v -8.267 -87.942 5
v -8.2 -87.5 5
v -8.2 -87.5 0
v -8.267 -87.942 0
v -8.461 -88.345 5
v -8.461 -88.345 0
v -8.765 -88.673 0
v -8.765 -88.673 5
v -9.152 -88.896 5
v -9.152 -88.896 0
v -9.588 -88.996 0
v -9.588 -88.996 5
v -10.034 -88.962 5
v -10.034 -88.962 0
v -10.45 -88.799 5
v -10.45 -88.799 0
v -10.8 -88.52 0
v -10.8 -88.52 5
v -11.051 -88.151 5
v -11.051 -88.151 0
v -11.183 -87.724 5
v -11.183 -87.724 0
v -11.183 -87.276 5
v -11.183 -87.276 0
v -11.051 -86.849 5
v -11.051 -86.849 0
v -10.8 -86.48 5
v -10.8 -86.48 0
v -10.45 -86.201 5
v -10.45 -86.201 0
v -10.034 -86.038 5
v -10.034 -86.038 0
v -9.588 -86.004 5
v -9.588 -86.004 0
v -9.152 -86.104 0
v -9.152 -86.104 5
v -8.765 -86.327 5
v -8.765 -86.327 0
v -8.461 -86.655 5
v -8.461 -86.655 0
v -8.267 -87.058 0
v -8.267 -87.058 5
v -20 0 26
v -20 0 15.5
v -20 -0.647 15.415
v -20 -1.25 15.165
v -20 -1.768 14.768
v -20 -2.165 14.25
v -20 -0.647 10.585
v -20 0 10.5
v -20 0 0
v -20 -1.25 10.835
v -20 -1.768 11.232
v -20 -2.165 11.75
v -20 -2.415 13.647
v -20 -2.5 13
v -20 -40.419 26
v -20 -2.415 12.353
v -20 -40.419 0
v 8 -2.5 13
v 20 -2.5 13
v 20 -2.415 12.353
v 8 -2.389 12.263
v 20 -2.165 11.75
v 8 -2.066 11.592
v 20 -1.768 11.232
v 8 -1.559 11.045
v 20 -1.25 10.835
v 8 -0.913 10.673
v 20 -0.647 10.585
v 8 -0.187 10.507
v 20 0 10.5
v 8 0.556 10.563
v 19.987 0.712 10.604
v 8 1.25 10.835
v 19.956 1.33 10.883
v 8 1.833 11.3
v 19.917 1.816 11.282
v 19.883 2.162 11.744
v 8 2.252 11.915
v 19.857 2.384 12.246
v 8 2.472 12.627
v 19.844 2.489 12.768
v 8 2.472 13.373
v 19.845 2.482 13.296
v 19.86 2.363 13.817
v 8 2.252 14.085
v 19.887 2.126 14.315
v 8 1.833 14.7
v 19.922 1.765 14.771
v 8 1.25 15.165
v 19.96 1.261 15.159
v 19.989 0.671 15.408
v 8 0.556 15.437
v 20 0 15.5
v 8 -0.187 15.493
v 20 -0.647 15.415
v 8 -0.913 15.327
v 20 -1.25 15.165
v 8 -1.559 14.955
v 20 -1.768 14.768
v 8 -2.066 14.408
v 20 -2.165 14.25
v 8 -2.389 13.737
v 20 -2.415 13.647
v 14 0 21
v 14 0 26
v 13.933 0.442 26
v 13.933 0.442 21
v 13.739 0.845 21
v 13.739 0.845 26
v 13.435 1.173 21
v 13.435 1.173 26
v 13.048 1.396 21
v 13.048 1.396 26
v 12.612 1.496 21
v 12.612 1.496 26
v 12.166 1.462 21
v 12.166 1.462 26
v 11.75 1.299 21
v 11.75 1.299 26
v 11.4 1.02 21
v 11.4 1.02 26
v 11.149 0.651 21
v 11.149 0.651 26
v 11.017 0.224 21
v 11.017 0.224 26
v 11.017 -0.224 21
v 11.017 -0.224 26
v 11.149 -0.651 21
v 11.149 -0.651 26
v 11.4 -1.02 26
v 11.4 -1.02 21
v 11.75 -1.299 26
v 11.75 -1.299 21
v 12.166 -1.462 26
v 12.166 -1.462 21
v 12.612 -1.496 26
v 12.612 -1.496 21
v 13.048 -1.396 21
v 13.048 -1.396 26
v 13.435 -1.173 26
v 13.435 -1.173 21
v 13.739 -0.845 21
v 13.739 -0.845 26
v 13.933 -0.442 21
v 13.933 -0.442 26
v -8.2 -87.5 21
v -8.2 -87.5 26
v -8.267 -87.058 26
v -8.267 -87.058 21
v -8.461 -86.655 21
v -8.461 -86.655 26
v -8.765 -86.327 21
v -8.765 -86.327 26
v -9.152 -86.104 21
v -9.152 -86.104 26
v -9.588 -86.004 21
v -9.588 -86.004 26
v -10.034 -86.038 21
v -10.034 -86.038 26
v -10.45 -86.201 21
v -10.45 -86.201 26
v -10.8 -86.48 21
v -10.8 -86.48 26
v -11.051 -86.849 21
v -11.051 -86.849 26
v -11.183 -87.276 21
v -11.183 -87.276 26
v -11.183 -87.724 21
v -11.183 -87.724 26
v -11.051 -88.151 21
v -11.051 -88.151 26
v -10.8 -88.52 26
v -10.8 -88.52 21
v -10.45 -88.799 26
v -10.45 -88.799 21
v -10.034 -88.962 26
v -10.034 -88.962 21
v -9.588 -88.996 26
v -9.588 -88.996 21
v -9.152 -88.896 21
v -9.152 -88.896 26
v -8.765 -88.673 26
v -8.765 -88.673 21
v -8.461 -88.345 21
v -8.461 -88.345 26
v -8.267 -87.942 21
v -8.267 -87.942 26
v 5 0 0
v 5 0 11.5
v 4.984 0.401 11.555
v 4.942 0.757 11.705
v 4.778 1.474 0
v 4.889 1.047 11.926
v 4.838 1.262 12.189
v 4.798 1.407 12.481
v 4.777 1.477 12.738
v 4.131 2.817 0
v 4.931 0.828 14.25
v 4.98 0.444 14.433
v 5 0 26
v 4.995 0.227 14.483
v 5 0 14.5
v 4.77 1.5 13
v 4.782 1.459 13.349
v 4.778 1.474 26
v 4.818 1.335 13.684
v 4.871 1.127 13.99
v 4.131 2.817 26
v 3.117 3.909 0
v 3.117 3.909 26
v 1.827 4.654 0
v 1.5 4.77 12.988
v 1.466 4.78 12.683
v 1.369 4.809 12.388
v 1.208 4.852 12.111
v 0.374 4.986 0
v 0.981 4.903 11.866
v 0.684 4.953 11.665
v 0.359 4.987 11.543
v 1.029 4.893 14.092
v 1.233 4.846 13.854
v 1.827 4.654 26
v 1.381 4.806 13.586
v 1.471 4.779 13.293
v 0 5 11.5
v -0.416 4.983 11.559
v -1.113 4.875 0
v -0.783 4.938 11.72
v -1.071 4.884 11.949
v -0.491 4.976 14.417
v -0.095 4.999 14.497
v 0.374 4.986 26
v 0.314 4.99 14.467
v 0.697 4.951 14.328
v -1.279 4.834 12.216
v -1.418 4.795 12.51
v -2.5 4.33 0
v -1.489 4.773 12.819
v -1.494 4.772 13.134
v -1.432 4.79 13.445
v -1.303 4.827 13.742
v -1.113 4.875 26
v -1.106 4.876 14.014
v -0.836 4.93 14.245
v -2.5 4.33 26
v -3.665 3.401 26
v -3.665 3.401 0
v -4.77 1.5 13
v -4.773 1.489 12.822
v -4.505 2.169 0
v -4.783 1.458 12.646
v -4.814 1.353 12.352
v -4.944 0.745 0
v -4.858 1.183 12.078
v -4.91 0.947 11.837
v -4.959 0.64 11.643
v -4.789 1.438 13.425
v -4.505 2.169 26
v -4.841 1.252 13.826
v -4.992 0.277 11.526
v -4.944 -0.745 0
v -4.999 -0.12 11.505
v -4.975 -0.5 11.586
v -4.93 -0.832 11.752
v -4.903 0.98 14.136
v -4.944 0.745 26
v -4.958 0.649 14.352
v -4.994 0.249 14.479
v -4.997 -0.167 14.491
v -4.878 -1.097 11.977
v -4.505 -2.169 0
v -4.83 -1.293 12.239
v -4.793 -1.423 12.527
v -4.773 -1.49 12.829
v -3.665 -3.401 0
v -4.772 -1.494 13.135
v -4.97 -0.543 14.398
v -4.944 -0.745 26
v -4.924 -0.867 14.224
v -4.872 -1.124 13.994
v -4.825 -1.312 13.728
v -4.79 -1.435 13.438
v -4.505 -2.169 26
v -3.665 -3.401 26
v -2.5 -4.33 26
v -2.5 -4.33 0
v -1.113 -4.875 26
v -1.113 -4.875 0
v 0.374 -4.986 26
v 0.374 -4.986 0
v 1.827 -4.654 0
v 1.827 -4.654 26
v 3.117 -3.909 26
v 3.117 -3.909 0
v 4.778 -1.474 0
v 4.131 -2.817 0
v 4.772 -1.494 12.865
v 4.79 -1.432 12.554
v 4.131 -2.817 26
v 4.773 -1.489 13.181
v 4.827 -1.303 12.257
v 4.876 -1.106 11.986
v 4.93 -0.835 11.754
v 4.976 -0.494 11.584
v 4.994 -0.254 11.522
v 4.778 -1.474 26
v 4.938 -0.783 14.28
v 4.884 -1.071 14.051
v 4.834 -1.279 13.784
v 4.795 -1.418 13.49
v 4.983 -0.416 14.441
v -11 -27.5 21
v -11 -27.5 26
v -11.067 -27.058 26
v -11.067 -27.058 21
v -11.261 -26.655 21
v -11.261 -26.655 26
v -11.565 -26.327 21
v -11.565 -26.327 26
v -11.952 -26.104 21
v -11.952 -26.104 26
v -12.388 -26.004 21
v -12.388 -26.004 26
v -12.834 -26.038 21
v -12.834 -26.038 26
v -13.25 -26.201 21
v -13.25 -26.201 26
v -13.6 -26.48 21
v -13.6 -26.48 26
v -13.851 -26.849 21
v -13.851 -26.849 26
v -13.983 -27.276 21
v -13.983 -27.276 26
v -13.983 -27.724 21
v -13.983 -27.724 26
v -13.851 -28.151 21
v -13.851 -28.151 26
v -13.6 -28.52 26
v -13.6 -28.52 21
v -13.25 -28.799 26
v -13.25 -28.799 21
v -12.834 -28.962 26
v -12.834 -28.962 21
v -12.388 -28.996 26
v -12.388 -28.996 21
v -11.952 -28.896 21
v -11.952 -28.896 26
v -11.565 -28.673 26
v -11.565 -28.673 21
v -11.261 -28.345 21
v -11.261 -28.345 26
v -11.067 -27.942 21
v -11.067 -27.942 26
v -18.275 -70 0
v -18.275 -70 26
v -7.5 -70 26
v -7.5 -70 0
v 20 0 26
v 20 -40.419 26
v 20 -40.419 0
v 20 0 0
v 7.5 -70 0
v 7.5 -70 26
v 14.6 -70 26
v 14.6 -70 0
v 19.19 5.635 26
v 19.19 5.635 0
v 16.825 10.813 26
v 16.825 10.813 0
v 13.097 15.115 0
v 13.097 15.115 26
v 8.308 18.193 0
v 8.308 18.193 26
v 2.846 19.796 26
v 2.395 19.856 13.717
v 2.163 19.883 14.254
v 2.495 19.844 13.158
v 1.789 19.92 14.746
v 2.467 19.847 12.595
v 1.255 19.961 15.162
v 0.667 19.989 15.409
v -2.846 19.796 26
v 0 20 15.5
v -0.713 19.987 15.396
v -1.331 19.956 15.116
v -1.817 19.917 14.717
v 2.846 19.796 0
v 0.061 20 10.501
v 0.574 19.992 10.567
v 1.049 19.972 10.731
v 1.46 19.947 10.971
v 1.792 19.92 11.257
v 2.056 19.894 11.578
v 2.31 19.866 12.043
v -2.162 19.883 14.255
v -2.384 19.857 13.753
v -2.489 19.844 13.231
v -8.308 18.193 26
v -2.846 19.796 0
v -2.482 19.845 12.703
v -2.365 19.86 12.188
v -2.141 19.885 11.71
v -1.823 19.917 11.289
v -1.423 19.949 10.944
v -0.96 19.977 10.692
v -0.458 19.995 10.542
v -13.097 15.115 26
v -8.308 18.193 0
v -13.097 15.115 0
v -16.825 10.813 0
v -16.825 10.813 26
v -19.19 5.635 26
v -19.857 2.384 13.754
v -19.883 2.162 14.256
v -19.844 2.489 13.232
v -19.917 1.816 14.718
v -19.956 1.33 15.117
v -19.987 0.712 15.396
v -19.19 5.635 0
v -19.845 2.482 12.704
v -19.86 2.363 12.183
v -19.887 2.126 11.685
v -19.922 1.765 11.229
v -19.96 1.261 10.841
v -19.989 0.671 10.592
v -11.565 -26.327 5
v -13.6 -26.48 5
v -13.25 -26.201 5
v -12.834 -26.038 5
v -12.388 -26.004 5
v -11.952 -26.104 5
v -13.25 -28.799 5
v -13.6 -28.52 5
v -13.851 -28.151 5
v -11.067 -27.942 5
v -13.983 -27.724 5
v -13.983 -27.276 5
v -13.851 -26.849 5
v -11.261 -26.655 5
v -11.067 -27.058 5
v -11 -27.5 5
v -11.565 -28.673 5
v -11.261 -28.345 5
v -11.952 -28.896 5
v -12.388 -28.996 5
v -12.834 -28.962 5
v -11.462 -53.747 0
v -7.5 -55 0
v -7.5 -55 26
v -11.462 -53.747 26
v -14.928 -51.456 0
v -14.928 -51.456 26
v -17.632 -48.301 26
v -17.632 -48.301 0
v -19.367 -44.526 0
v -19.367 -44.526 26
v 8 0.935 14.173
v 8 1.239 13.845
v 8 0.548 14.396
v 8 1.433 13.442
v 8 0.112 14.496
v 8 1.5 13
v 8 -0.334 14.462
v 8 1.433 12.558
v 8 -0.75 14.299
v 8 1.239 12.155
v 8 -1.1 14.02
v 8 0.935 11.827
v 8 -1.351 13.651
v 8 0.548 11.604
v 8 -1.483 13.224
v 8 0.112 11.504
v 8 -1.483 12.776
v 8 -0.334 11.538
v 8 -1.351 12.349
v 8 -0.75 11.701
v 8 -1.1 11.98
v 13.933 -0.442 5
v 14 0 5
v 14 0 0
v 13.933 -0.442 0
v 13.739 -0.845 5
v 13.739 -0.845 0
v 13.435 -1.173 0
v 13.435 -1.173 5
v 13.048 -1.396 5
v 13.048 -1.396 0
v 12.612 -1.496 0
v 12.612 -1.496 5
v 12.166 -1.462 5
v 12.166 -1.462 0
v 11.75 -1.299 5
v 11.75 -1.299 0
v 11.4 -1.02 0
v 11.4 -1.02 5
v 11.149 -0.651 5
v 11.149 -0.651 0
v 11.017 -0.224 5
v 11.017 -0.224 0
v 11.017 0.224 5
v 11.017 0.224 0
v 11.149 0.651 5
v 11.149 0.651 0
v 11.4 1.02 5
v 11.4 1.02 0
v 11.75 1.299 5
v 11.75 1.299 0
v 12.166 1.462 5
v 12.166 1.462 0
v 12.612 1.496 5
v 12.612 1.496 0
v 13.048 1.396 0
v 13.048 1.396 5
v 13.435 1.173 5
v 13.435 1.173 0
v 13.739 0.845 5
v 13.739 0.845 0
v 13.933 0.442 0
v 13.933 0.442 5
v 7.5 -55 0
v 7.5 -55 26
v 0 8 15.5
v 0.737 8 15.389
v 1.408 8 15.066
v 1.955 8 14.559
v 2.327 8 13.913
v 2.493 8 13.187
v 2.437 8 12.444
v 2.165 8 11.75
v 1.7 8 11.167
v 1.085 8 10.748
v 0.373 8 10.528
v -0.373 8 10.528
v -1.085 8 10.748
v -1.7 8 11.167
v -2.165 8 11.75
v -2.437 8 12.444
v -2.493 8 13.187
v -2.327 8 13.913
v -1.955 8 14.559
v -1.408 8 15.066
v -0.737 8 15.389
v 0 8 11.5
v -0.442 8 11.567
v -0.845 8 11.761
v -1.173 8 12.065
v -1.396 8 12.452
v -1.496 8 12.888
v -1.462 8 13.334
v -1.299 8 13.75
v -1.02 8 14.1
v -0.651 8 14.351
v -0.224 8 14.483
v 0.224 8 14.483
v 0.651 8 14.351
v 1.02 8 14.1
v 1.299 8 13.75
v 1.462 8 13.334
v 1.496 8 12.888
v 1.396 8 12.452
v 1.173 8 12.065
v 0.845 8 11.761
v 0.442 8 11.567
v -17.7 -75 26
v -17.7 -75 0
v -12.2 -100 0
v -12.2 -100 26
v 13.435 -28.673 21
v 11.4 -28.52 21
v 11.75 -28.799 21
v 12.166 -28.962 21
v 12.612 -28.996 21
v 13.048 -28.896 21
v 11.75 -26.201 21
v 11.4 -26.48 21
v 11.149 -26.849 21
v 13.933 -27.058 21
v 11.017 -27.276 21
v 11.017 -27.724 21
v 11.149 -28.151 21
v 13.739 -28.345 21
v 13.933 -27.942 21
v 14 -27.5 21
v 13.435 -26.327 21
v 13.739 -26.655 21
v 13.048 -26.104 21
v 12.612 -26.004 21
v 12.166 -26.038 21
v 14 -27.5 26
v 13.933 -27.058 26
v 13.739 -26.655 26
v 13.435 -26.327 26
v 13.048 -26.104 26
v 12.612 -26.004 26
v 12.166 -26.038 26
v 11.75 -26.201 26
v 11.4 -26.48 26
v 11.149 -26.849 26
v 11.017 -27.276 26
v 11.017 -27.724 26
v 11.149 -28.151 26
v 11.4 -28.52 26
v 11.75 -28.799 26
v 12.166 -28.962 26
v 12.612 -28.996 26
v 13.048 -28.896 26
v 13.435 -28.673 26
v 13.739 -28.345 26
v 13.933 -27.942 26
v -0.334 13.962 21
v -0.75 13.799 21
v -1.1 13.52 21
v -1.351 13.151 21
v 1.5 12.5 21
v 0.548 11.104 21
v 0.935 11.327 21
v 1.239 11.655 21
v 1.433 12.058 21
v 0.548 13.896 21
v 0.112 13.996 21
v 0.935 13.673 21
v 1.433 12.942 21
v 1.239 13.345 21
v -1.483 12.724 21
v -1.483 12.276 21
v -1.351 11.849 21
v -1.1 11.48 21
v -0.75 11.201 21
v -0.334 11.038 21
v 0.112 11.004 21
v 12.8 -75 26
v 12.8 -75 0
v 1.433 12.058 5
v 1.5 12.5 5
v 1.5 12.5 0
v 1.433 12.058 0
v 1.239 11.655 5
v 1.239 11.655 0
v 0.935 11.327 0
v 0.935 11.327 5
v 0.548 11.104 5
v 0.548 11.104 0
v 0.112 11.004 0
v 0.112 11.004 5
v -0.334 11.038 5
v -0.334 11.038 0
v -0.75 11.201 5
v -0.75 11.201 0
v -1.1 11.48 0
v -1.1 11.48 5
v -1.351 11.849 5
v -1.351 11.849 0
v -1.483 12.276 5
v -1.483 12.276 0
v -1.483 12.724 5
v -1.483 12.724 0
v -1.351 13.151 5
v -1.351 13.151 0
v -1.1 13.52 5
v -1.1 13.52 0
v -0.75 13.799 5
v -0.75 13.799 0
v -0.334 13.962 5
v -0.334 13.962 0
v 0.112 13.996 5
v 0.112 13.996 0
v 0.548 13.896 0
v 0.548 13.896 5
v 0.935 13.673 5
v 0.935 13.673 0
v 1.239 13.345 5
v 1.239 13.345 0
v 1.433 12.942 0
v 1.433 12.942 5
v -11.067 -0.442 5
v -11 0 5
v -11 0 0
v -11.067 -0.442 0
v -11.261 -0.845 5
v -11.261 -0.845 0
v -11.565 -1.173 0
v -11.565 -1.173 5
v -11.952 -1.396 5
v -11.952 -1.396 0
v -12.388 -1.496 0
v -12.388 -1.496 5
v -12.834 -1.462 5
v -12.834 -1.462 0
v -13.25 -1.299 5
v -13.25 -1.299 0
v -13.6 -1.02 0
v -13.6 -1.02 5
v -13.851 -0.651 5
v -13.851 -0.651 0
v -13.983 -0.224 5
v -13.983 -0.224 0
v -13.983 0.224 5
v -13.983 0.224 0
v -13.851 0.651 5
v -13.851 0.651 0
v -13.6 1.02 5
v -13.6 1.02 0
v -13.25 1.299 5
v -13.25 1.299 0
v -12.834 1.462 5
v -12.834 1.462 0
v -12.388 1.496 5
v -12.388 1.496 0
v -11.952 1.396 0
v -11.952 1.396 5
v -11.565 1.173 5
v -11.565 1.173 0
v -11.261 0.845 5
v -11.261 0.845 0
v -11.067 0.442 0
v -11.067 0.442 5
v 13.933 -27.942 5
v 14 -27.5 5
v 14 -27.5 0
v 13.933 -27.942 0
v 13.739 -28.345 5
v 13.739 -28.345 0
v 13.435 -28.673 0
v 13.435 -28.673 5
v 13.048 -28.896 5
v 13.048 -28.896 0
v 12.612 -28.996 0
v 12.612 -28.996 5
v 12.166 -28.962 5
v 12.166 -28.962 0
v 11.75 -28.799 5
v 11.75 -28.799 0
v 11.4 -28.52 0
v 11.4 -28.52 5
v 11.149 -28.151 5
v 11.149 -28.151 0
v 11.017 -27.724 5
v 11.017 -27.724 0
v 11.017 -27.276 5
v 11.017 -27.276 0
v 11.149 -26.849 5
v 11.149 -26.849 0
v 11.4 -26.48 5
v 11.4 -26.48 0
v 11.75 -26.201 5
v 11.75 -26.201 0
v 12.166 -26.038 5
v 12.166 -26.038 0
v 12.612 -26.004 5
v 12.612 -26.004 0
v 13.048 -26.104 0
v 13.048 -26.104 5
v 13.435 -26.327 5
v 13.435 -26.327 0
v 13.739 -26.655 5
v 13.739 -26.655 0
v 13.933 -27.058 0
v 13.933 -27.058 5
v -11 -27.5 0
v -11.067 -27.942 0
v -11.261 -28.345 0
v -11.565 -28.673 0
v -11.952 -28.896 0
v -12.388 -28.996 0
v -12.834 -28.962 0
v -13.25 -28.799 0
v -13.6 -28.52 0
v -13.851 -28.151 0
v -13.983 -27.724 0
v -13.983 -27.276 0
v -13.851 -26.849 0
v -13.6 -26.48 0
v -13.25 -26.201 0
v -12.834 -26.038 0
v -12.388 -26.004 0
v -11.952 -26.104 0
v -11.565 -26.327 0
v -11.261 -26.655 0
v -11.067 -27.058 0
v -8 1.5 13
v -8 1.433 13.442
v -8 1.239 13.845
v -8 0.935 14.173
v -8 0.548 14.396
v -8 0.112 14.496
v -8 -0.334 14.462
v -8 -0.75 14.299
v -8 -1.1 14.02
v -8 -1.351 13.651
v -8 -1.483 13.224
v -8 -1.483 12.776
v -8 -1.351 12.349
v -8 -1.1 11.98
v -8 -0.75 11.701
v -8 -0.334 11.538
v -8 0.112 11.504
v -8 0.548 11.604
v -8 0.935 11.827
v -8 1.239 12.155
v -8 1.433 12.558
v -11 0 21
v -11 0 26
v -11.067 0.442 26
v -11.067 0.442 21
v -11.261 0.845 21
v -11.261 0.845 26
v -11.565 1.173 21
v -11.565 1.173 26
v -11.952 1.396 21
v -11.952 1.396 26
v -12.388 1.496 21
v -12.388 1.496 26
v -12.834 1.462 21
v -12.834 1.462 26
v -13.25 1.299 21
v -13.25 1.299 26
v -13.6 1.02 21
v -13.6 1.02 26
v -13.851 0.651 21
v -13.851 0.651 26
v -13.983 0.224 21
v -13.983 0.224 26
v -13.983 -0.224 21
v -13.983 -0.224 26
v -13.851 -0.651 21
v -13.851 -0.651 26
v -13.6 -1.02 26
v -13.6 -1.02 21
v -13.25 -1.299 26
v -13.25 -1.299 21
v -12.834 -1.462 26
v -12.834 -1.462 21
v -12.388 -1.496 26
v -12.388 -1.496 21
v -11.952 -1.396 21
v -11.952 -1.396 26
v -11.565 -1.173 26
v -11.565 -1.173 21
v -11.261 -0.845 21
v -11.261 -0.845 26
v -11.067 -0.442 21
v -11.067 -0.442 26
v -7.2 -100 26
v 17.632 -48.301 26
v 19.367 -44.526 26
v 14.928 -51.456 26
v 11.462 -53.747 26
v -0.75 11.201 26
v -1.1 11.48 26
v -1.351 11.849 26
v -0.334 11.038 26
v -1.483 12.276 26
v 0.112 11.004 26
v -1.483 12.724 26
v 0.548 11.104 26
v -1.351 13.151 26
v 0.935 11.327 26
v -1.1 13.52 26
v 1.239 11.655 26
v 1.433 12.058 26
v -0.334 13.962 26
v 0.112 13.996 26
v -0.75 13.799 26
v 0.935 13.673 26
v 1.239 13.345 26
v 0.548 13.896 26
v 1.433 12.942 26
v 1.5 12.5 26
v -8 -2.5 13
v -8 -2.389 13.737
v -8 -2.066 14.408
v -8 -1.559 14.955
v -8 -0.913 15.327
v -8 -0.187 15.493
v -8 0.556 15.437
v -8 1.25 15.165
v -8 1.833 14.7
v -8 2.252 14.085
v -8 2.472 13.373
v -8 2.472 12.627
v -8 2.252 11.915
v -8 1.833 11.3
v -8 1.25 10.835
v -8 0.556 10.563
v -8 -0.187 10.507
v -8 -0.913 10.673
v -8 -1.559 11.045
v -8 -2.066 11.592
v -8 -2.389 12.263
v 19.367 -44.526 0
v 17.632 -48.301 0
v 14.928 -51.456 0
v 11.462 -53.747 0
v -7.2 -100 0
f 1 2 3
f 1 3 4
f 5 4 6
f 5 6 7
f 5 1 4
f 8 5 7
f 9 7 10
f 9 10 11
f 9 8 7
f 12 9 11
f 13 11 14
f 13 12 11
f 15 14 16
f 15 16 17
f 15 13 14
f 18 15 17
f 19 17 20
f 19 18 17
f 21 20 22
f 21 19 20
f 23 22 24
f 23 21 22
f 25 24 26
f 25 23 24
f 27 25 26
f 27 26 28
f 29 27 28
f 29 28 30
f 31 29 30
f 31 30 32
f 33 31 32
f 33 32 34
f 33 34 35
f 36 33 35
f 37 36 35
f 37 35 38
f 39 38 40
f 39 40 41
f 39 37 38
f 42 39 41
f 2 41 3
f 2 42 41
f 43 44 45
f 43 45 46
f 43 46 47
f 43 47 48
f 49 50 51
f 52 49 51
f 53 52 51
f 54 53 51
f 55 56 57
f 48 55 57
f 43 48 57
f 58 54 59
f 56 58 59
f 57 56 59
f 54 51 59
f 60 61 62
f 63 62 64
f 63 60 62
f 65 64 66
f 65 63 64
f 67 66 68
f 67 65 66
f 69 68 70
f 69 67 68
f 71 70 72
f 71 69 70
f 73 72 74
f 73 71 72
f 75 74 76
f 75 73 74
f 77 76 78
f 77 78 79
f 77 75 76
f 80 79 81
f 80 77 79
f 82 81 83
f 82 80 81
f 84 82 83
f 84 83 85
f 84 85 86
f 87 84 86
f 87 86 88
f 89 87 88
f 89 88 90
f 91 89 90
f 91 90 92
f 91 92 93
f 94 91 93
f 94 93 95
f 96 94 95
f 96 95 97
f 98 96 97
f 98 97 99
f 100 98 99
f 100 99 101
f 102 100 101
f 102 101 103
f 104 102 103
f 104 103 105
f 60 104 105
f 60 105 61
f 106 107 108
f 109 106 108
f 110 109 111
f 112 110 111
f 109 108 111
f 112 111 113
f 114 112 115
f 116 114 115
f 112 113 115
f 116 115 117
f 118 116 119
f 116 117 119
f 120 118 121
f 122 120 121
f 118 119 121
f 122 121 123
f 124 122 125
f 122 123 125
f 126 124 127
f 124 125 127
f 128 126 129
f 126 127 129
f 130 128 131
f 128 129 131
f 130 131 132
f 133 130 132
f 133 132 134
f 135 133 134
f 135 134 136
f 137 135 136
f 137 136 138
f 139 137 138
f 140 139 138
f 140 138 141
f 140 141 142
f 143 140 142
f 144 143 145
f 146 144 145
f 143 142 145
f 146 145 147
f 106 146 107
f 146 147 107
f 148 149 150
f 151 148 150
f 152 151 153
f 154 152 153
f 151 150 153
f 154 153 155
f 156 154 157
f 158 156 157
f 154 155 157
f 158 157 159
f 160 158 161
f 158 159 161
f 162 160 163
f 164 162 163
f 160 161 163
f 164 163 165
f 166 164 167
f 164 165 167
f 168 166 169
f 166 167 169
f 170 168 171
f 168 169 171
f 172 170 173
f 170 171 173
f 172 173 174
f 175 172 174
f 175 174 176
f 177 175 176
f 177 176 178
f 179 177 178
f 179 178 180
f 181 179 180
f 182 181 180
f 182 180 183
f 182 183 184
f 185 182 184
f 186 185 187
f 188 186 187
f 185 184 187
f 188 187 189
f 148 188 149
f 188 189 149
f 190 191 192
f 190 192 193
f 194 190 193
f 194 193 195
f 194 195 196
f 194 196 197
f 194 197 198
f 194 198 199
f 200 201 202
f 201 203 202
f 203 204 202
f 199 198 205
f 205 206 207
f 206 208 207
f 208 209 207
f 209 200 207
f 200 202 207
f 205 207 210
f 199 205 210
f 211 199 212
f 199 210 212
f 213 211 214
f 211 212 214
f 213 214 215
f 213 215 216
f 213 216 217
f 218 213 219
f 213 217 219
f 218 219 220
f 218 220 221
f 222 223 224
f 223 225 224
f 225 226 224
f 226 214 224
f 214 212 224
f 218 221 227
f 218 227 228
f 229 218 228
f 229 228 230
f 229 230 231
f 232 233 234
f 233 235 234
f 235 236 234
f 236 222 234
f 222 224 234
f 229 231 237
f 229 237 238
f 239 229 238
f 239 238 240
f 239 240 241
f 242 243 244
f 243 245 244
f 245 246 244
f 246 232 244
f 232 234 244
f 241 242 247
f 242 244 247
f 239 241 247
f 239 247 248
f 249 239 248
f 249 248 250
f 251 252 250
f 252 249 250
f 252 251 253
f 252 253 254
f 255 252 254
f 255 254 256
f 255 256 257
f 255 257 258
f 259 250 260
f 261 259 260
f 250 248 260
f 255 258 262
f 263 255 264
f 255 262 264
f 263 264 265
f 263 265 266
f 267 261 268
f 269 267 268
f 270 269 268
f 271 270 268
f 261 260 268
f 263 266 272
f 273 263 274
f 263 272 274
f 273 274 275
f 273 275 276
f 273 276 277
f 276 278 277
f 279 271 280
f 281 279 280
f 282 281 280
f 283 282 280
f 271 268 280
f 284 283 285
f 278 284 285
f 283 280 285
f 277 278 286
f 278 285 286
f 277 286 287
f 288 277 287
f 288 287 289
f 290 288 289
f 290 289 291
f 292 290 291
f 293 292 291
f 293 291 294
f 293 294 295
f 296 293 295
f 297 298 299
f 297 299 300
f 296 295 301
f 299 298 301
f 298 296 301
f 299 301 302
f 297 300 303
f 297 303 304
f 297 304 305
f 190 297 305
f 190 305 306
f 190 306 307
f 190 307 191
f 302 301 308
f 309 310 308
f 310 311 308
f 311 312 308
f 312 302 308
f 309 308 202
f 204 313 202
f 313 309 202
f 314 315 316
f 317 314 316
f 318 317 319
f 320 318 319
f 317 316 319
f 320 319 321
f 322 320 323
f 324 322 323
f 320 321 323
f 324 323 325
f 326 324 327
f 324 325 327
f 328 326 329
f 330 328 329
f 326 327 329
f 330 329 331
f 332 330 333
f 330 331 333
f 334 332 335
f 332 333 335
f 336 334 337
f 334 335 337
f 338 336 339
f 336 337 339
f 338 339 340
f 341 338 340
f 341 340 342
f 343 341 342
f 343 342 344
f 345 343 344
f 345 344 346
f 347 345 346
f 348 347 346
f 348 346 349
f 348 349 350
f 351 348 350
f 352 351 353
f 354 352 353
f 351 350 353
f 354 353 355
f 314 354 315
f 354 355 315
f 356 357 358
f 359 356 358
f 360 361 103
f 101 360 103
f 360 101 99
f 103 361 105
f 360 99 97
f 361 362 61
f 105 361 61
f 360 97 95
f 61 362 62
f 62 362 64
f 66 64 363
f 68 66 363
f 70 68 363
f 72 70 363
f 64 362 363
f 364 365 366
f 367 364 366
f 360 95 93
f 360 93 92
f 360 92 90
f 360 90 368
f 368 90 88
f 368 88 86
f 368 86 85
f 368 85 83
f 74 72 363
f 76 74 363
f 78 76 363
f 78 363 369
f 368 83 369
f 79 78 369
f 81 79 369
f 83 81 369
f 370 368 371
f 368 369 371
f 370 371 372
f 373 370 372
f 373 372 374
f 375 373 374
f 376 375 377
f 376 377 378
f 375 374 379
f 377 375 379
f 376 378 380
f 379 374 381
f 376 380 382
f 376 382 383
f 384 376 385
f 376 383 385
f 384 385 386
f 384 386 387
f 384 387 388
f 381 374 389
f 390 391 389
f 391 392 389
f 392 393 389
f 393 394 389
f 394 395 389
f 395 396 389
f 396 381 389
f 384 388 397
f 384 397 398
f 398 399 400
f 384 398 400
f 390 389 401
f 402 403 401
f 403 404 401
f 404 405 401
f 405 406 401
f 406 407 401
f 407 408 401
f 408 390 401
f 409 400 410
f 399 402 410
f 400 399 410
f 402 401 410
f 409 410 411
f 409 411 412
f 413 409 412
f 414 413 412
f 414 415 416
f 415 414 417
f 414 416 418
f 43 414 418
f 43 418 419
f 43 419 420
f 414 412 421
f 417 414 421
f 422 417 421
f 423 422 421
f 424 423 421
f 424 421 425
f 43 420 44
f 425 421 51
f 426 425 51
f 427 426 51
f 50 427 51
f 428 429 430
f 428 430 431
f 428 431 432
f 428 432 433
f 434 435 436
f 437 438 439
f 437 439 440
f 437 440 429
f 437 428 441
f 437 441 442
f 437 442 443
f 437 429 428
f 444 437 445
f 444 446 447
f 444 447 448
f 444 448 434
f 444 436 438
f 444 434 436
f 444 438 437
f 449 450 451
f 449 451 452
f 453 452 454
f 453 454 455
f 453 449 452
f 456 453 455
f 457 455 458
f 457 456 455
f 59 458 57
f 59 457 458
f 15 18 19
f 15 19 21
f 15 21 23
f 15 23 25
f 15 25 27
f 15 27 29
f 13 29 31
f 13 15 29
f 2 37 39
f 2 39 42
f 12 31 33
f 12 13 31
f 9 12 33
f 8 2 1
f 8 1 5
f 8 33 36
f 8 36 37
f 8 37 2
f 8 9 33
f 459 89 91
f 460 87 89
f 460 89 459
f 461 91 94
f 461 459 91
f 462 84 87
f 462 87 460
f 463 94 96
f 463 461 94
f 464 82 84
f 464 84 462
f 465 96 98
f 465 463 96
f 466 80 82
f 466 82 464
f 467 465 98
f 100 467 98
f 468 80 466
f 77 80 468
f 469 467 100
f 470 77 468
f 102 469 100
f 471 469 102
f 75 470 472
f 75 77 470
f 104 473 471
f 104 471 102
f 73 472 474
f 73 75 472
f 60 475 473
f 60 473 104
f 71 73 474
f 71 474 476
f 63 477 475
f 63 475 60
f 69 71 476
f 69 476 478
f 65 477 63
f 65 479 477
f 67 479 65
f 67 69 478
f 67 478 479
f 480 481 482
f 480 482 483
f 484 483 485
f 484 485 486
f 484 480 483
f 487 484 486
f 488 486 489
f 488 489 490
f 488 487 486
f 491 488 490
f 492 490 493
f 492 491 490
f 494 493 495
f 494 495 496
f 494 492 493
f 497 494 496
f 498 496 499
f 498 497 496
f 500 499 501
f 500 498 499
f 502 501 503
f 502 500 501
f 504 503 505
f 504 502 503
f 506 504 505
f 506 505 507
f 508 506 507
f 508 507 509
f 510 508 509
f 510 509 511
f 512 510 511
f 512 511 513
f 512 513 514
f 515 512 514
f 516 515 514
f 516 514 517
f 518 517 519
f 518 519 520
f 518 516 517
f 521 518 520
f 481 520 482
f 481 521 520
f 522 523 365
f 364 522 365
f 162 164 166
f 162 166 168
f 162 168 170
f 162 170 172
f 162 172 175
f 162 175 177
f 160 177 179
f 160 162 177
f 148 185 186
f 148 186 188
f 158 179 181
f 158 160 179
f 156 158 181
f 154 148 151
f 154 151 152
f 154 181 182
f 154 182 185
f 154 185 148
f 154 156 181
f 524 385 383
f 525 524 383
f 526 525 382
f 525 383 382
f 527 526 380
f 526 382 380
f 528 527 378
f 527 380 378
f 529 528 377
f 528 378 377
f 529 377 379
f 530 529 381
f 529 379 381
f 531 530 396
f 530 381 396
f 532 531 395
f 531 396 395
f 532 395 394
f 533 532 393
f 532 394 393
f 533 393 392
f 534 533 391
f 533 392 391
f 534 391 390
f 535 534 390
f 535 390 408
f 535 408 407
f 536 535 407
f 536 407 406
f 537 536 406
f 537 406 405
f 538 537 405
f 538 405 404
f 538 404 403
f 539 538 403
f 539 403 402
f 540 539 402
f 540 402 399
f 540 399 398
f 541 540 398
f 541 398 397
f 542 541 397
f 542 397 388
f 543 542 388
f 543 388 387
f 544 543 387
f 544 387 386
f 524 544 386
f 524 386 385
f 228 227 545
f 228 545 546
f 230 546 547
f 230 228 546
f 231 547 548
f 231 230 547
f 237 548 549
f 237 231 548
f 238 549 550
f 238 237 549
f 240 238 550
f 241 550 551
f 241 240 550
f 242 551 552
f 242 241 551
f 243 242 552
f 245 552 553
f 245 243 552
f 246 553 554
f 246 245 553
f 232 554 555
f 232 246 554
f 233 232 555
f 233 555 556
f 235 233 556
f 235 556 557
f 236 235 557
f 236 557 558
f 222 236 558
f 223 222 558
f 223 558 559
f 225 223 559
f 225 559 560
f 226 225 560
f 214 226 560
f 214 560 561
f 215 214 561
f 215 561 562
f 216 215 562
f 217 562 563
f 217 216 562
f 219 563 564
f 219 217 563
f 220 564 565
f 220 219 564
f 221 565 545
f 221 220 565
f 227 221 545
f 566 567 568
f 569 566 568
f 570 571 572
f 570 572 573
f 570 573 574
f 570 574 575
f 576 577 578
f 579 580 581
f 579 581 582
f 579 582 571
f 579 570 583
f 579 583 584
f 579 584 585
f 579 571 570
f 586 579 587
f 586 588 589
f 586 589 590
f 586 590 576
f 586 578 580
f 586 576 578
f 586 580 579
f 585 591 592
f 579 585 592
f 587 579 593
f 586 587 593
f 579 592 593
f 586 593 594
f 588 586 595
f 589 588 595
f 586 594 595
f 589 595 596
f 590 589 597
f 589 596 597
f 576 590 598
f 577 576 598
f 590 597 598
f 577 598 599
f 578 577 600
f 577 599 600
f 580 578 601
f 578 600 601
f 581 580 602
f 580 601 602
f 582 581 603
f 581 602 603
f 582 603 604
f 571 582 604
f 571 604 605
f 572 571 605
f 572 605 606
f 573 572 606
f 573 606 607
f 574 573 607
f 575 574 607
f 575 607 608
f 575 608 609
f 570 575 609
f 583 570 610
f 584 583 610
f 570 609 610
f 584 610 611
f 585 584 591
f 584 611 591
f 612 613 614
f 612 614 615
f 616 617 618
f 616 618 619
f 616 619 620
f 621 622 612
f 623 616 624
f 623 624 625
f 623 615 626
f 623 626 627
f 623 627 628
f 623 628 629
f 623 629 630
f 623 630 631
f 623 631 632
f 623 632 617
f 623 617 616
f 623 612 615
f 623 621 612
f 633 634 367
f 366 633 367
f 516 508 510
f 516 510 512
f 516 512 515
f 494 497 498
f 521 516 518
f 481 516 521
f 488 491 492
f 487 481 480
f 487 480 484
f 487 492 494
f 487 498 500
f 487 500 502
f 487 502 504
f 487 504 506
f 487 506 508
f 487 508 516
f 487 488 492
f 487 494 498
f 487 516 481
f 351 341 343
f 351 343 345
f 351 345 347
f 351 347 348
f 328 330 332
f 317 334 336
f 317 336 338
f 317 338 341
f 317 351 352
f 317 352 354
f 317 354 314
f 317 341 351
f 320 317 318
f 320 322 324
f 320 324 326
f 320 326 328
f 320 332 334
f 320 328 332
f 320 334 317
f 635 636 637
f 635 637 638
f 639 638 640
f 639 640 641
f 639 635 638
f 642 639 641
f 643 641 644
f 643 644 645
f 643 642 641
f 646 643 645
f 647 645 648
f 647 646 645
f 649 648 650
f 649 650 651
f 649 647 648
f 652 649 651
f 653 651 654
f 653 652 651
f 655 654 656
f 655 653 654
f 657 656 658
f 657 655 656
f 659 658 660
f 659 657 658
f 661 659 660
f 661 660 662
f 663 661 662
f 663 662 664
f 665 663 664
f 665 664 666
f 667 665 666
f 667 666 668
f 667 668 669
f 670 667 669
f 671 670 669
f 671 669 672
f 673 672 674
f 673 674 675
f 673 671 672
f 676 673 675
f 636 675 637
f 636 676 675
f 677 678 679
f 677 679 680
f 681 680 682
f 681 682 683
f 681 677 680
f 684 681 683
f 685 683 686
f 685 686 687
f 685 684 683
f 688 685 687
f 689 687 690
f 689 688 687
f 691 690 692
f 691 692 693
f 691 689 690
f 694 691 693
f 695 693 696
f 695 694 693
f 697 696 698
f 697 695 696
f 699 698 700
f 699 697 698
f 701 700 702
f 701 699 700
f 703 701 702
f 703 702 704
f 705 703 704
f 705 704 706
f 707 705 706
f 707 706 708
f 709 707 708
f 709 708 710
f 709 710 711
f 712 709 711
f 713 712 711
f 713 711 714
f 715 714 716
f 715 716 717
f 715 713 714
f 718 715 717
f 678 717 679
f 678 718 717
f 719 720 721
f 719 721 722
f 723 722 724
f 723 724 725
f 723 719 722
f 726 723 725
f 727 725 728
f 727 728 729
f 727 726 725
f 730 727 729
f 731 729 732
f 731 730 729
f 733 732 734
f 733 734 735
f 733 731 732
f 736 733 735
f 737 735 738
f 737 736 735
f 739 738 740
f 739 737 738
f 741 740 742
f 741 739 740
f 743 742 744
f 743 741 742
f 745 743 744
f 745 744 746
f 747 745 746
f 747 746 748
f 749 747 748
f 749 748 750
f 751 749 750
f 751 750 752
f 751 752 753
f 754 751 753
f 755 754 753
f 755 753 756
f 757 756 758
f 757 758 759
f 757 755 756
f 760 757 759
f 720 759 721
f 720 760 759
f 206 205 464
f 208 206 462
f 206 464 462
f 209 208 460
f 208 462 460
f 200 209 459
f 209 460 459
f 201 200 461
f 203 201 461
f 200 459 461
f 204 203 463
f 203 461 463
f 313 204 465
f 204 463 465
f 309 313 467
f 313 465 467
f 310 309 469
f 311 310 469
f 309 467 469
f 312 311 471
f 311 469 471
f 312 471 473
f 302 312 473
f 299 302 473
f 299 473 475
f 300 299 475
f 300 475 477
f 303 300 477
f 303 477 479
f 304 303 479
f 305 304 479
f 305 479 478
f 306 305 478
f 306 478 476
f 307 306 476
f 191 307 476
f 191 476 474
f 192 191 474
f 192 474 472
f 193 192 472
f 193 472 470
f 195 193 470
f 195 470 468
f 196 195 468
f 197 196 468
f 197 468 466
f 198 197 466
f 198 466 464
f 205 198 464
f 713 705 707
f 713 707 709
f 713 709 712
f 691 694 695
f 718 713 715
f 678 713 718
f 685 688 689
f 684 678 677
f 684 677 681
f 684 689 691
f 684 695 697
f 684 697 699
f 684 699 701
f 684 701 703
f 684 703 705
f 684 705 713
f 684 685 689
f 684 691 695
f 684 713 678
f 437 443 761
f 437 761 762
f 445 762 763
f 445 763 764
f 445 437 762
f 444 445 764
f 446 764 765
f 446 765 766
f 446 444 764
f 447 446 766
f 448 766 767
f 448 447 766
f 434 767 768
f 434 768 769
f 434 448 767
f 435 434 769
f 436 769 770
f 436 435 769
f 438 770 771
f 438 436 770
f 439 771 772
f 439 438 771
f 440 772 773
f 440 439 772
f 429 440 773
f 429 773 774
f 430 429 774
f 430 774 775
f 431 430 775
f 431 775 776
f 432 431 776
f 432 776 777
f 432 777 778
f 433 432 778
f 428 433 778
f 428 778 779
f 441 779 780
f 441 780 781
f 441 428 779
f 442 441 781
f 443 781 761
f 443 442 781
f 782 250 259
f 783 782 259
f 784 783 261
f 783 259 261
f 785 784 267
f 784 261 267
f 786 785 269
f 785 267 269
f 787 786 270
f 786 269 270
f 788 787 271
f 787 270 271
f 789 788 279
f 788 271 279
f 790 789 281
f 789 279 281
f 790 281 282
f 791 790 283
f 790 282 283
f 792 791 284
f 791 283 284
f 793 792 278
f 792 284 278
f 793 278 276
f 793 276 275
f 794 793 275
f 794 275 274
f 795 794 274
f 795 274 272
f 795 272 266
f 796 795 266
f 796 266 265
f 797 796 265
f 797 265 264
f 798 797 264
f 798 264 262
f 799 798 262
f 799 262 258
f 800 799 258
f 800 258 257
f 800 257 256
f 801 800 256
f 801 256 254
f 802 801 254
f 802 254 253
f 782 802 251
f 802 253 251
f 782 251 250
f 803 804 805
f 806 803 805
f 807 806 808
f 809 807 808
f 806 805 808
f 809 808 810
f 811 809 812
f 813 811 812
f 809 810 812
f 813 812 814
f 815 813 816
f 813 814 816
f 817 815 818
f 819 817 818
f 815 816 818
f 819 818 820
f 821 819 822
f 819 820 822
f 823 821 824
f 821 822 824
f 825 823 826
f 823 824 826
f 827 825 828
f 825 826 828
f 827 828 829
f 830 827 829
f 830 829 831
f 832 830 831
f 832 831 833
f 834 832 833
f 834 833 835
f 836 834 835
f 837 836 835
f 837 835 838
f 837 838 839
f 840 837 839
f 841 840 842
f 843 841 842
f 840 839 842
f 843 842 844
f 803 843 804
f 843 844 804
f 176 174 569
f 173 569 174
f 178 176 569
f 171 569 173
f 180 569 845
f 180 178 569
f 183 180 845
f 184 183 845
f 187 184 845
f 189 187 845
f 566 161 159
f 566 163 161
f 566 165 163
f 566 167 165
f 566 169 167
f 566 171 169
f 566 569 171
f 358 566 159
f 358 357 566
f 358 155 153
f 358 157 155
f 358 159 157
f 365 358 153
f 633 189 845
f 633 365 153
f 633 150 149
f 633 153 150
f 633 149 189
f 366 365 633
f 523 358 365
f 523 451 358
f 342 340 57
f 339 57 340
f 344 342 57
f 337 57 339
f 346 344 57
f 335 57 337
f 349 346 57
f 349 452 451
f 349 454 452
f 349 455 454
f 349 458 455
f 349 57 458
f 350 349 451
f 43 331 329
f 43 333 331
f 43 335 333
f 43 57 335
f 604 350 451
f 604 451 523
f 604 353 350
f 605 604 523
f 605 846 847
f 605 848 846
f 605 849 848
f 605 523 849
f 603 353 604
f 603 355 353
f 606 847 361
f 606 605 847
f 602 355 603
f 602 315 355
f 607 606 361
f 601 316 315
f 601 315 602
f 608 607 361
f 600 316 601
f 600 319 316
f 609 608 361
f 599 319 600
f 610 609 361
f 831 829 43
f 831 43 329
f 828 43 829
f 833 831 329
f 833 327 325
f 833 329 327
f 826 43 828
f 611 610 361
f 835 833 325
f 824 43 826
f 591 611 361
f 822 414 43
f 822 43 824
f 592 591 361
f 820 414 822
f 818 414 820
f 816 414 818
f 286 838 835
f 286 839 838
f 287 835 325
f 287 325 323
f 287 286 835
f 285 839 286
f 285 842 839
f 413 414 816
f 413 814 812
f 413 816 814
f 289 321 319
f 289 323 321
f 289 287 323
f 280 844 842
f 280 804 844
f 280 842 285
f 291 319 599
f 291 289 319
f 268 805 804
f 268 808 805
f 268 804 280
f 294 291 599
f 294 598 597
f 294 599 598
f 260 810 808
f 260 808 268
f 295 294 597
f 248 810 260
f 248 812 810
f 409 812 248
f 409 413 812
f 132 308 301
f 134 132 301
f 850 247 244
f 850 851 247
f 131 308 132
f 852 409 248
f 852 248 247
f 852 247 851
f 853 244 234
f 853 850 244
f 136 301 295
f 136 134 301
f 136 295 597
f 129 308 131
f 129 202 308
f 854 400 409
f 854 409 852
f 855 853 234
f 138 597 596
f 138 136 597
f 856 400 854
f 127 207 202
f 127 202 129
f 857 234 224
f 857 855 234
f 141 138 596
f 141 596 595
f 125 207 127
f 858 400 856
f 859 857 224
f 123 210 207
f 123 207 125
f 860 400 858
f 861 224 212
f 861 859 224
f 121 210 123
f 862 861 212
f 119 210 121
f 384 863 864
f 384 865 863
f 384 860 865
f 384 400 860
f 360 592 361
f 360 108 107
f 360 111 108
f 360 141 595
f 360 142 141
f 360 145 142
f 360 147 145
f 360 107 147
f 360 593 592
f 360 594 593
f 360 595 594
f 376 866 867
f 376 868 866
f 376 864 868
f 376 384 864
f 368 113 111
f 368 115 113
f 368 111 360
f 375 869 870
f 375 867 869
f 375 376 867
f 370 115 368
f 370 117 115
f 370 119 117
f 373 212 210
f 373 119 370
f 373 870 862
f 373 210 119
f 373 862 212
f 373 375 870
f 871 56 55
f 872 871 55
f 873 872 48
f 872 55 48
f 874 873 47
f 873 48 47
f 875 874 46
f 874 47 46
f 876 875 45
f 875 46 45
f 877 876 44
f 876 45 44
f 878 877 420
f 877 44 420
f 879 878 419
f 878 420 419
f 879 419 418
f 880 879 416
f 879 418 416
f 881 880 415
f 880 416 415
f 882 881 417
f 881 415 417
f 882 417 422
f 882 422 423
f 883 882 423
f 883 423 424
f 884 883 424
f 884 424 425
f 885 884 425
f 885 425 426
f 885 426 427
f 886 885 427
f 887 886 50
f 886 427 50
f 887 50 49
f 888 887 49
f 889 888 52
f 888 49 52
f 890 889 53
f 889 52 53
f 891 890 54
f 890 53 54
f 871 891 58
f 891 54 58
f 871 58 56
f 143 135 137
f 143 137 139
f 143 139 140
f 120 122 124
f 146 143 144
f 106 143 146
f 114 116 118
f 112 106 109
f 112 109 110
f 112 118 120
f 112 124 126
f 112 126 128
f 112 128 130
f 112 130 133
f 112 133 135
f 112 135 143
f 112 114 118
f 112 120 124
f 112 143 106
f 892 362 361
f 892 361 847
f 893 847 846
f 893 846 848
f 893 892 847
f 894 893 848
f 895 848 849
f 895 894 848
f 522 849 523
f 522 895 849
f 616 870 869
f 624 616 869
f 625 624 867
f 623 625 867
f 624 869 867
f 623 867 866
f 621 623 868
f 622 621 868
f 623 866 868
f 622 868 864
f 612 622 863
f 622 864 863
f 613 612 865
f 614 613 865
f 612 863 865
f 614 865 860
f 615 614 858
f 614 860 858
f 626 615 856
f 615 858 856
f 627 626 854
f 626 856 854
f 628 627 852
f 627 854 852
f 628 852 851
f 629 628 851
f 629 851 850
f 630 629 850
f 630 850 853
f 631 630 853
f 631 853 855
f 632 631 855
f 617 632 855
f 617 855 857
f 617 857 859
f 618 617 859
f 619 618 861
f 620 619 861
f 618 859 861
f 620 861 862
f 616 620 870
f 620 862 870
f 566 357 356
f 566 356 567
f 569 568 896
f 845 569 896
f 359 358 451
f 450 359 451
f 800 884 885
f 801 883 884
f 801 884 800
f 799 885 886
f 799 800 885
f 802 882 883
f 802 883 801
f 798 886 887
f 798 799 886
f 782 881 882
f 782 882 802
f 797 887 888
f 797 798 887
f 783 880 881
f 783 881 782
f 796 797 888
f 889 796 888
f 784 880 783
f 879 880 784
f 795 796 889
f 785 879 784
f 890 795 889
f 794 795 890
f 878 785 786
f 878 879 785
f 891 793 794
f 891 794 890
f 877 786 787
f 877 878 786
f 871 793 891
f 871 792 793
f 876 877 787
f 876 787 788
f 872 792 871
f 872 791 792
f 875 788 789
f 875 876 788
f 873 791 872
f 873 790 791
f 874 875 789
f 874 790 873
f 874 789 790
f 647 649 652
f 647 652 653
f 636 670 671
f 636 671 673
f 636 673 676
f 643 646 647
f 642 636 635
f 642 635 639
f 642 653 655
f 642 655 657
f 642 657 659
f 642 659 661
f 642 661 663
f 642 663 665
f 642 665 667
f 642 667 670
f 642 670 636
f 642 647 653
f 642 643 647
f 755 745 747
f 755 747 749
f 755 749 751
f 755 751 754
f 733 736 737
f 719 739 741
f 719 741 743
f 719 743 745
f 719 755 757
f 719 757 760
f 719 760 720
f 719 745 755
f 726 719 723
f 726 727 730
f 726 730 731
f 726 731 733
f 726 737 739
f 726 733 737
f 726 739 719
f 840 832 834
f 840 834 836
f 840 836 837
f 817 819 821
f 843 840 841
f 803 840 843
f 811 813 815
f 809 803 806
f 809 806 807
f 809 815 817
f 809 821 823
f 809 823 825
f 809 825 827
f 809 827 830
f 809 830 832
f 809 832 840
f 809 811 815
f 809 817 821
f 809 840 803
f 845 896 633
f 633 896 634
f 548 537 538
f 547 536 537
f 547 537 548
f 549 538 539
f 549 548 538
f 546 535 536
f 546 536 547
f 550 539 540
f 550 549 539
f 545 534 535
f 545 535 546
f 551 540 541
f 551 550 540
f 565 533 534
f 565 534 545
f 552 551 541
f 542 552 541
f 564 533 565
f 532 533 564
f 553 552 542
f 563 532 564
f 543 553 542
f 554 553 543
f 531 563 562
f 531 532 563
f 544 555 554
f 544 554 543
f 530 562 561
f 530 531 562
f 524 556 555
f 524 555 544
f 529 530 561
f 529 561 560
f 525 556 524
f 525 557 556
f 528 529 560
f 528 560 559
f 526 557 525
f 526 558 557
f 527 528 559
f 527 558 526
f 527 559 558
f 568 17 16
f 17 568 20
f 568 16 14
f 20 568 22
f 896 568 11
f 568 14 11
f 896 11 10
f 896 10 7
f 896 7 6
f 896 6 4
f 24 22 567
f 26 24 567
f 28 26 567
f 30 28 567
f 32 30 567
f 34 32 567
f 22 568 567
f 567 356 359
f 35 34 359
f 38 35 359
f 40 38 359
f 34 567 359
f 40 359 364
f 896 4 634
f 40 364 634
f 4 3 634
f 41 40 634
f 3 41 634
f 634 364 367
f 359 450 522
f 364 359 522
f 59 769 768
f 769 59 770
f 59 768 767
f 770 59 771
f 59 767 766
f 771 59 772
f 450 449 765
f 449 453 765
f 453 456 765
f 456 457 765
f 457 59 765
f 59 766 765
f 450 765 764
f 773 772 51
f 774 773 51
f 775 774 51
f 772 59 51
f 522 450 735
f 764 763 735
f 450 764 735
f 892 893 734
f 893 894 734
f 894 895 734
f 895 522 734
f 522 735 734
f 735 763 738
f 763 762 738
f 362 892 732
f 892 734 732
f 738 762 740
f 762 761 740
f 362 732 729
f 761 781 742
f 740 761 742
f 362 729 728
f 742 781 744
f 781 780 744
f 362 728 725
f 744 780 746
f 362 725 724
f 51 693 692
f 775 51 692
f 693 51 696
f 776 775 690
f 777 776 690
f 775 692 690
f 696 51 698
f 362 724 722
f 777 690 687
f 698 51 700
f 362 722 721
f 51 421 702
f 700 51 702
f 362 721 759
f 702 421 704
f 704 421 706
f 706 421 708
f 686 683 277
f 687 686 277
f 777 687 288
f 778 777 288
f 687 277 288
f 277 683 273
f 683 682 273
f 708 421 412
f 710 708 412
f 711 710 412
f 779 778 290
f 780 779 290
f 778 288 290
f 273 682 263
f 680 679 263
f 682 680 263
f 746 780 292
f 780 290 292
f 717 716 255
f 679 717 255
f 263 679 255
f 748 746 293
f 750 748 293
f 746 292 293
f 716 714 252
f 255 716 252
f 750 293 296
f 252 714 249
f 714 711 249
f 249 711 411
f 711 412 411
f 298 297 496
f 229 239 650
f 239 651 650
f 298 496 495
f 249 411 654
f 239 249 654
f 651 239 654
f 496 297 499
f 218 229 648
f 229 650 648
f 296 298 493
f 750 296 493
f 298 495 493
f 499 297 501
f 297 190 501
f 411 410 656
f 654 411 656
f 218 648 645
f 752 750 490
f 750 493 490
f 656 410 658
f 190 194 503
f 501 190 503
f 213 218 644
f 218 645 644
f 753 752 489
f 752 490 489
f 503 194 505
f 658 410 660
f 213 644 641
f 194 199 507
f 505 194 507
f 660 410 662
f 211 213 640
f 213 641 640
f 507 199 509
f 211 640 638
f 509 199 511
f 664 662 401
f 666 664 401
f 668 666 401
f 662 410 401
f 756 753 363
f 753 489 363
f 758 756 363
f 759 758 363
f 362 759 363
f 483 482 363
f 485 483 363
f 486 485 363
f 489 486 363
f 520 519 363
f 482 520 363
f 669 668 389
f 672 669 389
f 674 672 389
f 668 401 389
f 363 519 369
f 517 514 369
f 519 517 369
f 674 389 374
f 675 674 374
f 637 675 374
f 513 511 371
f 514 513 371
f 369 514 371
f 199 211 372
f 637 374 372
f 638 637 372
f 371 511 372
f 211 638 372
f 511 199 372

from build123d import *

# Parameters (mm, degrees)
EXTRUDE_1_DEPTH          = 26
SKETCH_2_R               = 5
CUT_EXTRUDE_1_DEPTH      = 26
SKETCH_5_R               = 2.5
CUT_EXTRUDE_3_DEPTH      = 12
CUT_EXTRUDE_START        = -12
SKETCH_6_R               = 2.5
CUT_EXTRUDE_4_DEPTH      = 12
CUT_EXTRUDE_5_REACH      = 109.051
SKETCH_7_R               = 1.5
CUT_EXTRUDE_6_REACH      = 107.243
CUT_EXTRUDE_6_END_RADIUS = 20
SKETCH_8_R               = 1.5
SKETCH_10_R              = 2.5
CUT_EXTRUDE_7_DEPTH      = 12
CUT_EXTRUDE_8_REACH      = 107.243
CUT_EXTRUDE_START_2      = -26
CUT_EXTRUDE_9_DEPTH      = 26
SKETCH_13_R              = 1.5
CUT_EXTRUDE_10_DEPTH     = 5
CUT_EXTRUDE_START_3      = -5
SKETCH_14_R              = 1.5
CUT_EXTRUDE_11_DEPTH     = 5


# Read off the part's stored shape, not the designer's step: 切除-拉伸9
with BuildPart() as part:
    # 草图1 → 凸台-拉伸1 (new body)
    with BuildSketch(Plane.XY):
        with BuildLine():
            ThreePointArc((20, 0), (0, 20), (-20, 0))
            Line((-20, 0), (20, 0))
        make_face()
        with BuildLine():
            Line((20, 0), (-20, 0))
            ThreePointArc((-20, 0), (0, -20), (20, 0))
        make_face()
        with BuildLine():
            ThreePointArc((20, 0), (0, -20), (-20, 0))
            Line((-20, 0), (-20, -55))
            Line((-20, -55), (20, -55))
            Line((20, -55), (20, 0))
        make_face()
        Polygon((20, -55), (-20, -55), (-17.7, -75), (-12.2, -100), (-7.2, -100), (12.8, -75), align=None)
    extrude(amount=EXTRUDE_1_DEPTH)

    # 草图2 → 切除-拉伸1 (cut)
    with BuildSketch(Plane.XY.offset(26)):
        Circle(SKETCH_2_R)
    extrude(amount=-CUT_EXTRUDE_1_DEPTH, mode=Mode.SUBTRACT)

    # 草图5 → 切除-拉伸3 (cut)
    with BuildSketch(Plane.ZY.offset(20)):
        with Locations(Location((13, 0, 0), (0, 0, 270))):
            Circle(SKETCH_5_R)
    extrude(amount=-CUT_EXTRUDE_3_DEPTH, mode=Mode.SUBTRACT)

    # 草图6 → 切除-拉伸4 (cut)
    with BuildSketch(Plane(origin=(20, 0, 0), x_dir=(0, 0, -1), z_dir=(1, 0, 0)).offset(CUT_EXTRUDE_START)):
        with Locations(Location((-13, 0, 0), (0, 0, 270))):
            Circle(SKETCH_6_R)
    extrude(amount=CUT_EXTRUDE_4_DEPTH, mode=Mode.SUBTRACT)

    # 切除-拉伸5: up to this face of the body (flat: up to its plane)
    cut_extrude_5_end = Plane(part.part.faces().sort_by_distance((-8, 0, 13))[0])
    # 草图7 → 切除-拉伸5 (cut, up to the picked face)
    with BuildSketch(Plane(origin=(8, 0, 0), x_dir=(0, 0, -1), z_dir=(1, 0, 0)), mode=Mode.PRIVATE) as cut_extrude_5_sk1:
        with Locations(Location((-13, 0, 0), (0, 0, 90))):
            Circle(SKETCH_7_R)
    cut_extrude_5_tool1 = split(extrude(cut_extrude_5_sk1.sketch, amount=-CUT_EXTRUDE_5_REACH, mode=Mode.PRIVATE), bisect_by=cut_extrude_5_end, keep=Keep.BOTH, mode=Mode.PRIVATE)
    add(cut_extrude_5_tool1.solids().sort_by(Axis((8, 0, 13), (-1, 0, 0)))[0], mode=Mode.SUBTRACT)

    # 切除-拉伸6: up to this cylinder (the profile starts inside it)
    cut_extrude_6_end = Plane(origin=(0, 0, 13), z_dir=(0, 0, -1)) * Cylinder(CUT_EXTRUDE_6_END_RADIUS, 255.486, mode=Mode.PRIVATE)
    # 草图8 → 切除-拉伸6 (cut, up to the surface)
    with BuildSketch(Plane(origin=(0, 0, 0), x_dir=(1, 0, 0), z_dir=(0, 1, 0)), mode=Mode.PRIVATE) as cut_extrude_6_sk1:
        with Locations(Location((0, -13, 0), (0, 0, 90))):
            Circle(SKETCH_8_R)
    cut_extrude_6_tool1 = extrude(cut_extrude_6_sk1.sketch, amount=CUT_EXTRUDE_6_REACH, mode=Mode.PRIVATE) & cut_extrude_6_end
    add(cut_extrude_6_tool1.solids().sort_by_distance((0, 0, 13))[0], mode=Mode.SUBTRACT)

    # 草图10 → 切除-拉伸7 (cut)
    with BuildSketch(Plane(origin=(0, 20, 0), x_dir=(1, 0, 0), z_dir=(0, 1, 0))):
        with Locations(Location((0, -13, 0), (0, 0, 270))):
            Circle(SKETCH_10_R)
    extrude(amount=-CUT_EXTRUDE_7_DEPTH, mode=Mode.SUBTRACT)

    # 草图11 → 切除-拉伸8 (cut, up to next)
    with BuildSketch(Plane.XY.offset(26), mode=Mode.PRIVATE) as cut_extrude_8_sk1:
        Polygon((-7.5, -55), (-20, -55), (-18.275, -70), (-7.5, -70), align=None)
    cut_extrude_8_tool1 = extrude(cut_extrude_8_sk1.sketch, amount=-CUT_EXTRUDE_8_REACH, mode=Mode.PRIVATE) & part.part
    # 草图11 → 切除-拉伸8 (cut, up to next)
    with BuildSketch(Plane.XY.offset(26), mode=Mode.PRIVATE) as cut_extrude_8_sk2:
        Polygon((20, -55), (7.5, -55), (7.5, -70), (14.6, -70), align=None)
    cut_extrude_8_tool2 = extrude(cut_extrude_8_sk2.sketch, amount=-CUT_EXTRUDE_8_REACH, mode=Mode.PRIVATE) & part.part
    add(cut_extrude_8_tool1.solids().sort_by_distance((-13.329404, -62.314715, 26))[0], mode=Mode.SUBTRACT)
    add(cut_extrude_8_tool2.solids().sort_by_distance((12.52398, -61.811224, 26))[0], mode=Mode.SUBTRACT)

    # 切除-拉伸9 outline → 切除-拉伸9 (cut)
    with BuildSketch(Plane.XY.offset(26).offset(CUT_EXTRUDE_START_2)):
        with BuildLine():
            ThreePointArc((-7.5, -55), (-16.389505797, -49.97236528), (-20, -40.419106371))
            Line((-20, -40.419106371), (-20, -55))
            Line((-20, -55), (-7.5, -55))
        make_face()
        with BuildLine():
            ThreePointArc((20, -40.419106371), (16.389505797, -49.97236528), (7.5, -55))
            Line((7.5, -55), (20, -55))
            Line((20, -55), (20, -40.419106371))
        make_face()
    extrude(amount=CUT_EXTRUDE_9_DEPTH, mode=Mode.SUBTRACT)

    # 草图13 → 切除-拉伸10 (cut)
    with BuildSketch(Plane.XY.offset(26)):
        with Locations((-12.5, -27.5)):
            Circle(SKETCH_13_R)
        with Locations((12.5, -27.5)):
            Circle(SKETCH_13_R)
        with Locations((12.5, 0)):
            Circle(SKETCH_13_R)
        with Locations((0, 12.5)):
            Circle(SKETCH_13_R)
        with Locations((-12.5, 0)):
            Circle(SKETCH_13_R)
        with Locations((-9.7, -87.5)):
            Circle(SKETCH_13_R)
    extrude(amount=-CUT_EXTRUDE_10_DEPTH, mode=Mode.SUBTRACT)

    # 草图14 → 切除-拉伸11 (cut)
    with BuildSketch(Plane(origin=(0, 0, 0), x_dir=(-1, 0, 0), z_dir=(0, 0, -1)).offset(CUT_EXTRUDE_START_3)):
        with Locations(Location((12.5, 0, 0), (0, 0, 180))):
            Circle(SKETCH_14_R)
        with Locations(Location((0, 12.5, 0), (0, 0, 180))):
            Circle(SKETCH_14_R)
        with Locations(Location((-12.5, 0, 0), (0, 0, 180))):
            Circle(SKETCH_14_R)
        with Locations(Location((-12.5, -27.5, 0), (0, 0, 180))):
            Circle(SKETCH_14_R)
        with Locations(Location((12.5, -27.5, 0), (0, 0, 180))):
            Circle(SKETCH_14_R)
        with Locations(Location((9.7, -87.5, 0), (0, 0, 180))):
            Circle(SKETCH_14_R)
    extrude(amount=CUT_EXTRUDE_11_DEPTH, mode=Mode.SUBTRACT)


solid = part.part
